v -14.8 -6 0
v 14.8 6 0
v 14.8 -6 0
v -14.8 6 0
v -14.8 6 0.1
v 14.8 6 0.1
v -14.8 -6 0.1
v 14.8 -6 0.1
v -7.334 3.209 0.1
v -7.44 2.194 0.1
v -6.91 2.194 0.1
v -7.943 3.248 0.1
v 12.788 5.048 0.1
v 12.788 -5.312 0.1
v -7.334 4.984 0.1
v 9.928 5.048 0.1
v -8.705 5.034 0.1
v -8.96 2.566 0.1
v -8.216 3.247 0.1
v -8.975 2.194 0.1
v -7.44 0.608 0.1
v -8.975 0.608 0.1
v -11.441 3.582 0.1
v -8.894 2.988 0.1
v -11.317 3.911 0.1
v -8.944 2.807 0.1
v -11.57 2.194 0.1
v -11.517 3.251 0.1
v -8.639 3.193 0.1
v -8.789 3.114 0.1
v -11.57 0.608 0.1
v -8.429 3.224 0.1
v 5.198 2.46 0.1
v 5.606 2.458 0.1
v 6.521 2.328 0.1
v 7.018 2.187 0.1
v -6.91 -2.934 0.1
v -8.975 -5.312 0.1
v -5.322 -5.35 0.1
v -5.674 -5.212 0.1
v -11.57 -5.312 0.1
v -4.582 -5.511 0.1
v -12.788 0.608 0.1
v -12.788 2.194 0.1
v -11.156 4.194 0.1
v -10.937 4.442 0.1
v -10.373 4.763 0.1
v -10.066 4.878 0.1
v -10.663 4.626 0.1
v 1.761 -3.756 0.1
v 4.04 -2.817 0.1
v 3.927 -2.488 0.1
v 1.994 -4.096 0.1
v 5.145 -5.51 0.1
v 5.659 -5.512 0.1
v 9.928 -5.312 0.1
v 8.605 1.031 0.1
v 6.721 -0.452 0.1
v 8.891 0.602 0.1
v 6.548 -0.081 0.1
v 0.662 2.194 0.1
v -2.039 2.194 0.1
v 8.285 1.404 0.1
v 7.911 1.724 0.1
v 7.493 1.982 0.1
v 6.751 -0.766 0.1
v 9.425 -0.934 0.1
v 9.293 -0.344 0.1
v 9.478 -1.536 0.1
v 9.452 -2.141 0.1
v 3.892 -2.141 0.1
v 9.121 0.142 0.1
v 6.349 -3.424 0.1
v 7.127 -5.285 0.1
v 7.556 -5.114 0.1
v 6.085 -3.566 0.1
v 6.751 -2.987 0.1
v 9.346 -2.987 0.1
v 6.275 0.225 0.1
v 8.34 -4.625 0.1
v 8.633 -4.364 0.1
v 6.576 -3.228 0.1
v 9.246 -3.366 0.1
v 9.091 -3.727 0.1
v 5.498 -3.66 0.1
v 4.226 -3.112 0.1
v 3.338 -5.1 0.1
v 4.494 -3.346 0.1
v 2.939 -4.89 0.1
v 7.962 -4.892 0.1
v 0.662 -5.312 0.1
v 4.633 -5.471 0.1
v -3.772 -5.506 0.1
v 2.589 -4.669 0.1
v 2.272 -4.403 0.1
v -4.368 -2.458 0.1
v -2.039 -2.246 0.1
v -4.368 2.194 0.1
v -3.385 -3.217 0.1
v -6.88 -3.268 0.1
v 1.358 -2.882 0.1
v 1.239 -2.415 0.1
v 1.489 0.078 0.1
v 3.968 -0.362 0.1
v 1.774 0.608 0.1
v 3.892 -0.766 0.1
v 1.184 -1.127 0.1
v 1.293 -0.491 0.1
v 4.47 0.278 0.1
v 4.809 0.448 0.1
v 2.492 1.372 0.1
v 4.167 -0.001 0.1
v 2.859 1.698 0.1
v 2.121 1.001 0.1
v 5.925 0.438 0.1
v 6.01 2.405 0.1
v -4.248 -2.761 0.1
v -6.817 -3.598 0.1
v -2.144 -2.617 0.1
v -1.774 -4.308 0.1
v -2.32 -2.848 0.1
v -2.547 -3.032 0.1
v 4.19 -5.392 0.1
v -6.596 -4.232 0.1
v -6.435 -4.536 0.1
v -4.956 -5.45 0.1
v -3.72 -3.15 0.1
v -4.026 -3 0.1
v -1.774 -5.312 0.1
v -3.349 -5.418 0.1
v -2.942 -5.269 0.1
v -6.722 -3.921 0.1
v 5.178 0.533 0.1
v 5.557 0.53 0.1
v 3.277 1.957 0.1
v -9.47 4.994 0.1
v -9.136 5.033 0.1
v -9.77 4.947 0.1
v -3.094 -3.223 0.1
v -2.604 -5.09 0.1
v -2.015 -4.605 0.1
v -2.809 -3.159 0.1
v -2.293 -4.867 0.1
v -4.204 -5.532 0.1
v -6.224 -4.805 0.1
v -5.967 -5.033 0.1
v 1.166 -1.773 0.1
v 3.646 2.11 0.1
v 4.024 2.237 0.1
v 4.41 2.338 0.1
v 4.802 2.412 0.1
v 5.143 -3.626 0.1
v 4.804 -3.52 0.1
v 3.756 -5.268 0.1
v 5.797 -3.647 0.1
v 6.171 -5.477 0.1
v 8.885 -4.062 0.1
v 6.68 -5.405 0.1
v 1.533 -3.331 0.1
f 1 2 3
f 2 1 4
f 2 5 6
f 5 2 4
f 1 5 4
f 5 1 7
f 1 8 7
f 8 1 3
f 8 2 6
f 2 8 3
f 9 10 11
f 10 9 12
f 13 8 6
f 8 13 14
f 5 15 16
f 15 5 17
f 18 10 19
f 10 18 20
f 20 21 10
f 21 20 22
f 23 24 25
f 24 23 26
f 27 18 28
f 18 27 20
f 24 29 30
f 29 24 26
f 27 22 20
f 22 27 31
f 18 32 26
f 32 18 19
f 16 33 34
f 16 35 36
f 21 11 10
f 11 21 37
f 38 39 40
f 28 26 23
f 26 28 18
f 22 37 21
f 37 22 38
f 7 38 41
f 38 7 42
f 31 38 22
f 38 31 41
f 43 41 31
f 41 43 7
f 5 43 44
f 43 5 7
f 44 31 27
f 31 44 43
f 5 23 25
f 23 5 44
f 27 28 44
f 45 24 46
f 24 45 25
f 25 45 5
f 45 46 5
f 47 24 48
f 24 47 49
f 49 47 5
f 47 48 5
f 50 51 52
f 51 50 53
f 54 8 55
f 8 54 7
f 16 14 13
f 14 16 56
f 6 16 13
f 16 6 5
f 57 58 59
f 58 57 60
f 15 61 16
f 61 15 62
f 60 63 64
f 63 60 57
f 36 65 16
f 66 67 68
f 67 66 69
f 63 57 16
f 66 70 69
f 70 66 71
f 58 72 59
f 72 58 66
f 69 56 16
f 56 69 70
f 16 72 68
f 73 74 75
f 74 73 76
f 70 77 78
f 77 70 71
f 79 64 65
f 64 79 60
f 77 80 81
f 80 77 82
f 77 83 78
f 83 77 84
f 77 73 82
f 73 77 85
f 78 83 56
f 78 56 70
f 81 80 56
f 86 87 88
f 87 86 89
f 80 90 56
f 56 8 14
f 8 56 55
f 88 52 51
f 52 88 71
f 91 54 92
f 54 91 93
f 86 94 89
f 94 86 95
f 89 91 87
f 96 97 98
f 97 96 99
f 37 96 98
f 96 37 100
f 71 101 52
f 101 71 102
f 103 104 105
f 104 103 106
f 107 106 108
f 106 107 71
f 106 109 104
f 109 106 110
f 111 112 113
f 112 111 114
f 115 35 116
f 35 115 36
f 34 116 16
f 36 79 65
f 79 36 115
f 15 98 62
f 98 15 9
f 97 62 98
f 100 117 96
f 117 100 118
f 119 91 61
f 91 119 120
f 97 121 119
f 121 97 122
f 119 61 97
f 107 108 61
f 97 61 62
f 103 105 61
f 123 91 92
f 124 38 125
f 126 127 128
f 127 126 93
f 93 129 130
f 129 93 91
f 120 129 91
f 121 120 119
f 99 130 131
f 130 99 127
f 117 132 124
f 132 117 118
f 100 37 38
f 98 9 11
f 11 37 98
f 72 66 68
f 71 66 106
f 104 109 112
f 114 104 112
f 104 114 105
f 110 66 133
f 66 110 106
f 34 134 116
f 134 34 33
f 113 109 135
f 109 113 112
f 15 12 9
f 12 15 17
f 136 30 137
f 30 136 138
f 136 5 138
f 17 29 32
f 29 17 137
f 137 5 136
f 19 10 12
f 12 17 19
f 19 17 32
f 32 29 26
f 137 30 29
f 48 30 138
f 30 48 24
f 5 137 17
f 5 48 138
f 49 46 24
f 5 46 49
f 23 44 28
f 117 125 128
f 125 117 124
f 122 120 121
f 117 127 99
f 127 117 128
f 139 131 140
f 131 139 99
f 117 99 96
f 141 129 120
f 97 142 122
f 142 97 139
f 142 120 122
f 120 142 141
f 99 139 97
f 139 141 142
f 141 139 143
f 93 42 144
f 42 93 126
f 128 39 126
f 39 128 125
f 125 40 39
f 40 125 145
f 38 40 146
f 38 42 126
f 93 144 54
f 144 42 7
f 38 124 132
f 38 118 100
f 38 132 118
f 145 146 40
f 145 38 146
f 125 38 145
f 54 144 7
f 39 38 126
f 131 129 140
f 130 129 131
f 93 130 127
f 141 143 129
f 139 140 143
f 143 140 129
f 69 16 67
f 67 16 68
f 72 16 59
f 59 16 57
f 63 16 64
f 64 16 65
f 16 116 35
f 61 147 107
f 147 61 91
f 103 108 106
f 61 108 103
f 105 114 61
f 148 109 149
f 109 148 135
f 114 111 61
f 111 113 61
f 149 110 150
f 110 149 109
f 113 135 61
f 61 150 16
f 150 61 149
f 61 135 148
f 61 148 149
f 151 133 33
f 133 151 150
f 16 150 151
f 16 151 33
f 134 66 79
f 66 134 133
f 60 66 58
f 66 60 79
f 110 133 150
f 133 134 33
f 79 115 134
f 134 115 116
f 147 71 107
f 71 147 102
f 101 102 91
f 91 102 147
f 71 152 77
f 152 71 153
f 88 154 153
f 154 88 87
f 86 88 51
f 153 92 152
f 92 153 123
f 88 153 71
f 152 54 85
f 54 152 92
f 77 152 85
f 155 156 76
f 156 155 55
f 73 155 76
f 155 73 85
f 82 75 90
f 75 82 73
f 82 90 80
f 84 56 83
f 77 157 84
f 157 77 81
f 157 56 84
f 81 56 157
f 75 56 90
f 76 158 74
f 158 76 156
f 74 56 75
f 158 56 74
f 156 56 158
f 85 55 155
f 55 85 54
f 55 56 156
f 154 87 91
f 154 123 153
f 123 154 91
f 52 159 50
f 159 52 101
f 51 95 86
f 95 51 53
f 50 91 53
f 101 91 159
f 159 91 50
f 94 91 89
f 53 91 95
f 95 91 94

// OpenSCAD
// file: ../p/box5-12.scad
use <../lib.scad>
function ldraw_lib__box5_12() = [
// 0 Box with 5 Faces without Any Edges
// 0 Name: box5-12.dat
// 0 Author: Chris Dee [cwdee]
// 0 !LDRAW_ORG Primitive UPDATE 2009-02
// 0 !LICENSE Licensed under CC BY 4.0 : see CAreadme.txt
// 
// 0 BFC CERTIFY CCW
  [0,"BFC","CERTIFY"],
  [0,"BFC","CCW"],
// 
// 0 !HISTORY 2009-09-03 [PTadmin] Official Update 2009-02
// 
// 
// 4 16 1 1 1 1 1 -1 -1 1 -1 -1 1 1
  [4,16,1,1,1,1,1,-1,-1,1,-1,-1,1,1],
// 4 16 -1 0 1 1 0 1 1 1 1 -1 1 1
  [4,16,-1,0,1,1,0,1,1,1,1,-1,1,1],
// 4 16 -1 0 -1 -1 0 1 -1 1 1 -1 1 -1
  [4,16,-1,0,-1,-1,0,1,-1,1,1,-1,1,-1],
// 4 16 1 0 -1 -1 0 -1 -1 1 -1 1 1 -1
  [4,16,1,0,-1,-1,0,-1,-1,1,-1,1,1,-1],
// 4 16 1 0 1 1 0 -1 1 1 -1 1 1 1
  [4,16,1,0,1,1,0,-1,1,1,-1,1,1,1],
// 0
];
module ldraw_lib__box5_12(step=0, col=false, unit=2/5, alt=false, line=0.2, solid=!$preview)
    makepoly(ldraw_lib__box5_12(), step=step, col=col, unit=unit, alt=alt, line=line, solid=solid);
ldraw_lib__box5_12(line=0.2);
// main file
use <../lib.scad>
use <../p/box5-12.scad>
function ldraw_lib__197915c() = [
// 0 Sticker  1.6 x  3.8 with White "fuel"
// 0 Name: 197915c.dat
// 0 Author: N. W. Perry [Plastikean]
// 0 !LDRAW_ORG Part UPDATE 2020-03
// 0 !LICENSE Licensed under CC BY 4.0 : see CAreadme.txt
// 
// 0 BFC CERTIFY CCW
  [0,"BFC","CERTIFY"],
  [0,"BFC","CCW"],
// 
// 0 !KEYWORDS set 5540
// 
// 0 !HISTORY 2020-12-29 [PTadmin] Official Update 2020-03
// 
// 
// 1 16 0 -0.25 0 37 0 0 0 0.25 0 0 0 15 box5-12.dat
  [1,16,0,-0.25,0,37,0,0,0,0.25,0,0,0,15, ldraw_lib__box5_12()],
// 
// 4 16 -18.335 -0.25 8.022 -19.857 -0.25 8.12 -18.599 -0.25 5.484 -17.276 -0.25 5.484
  [4,16,-18.335,-0.25,8.022,-19.857,-0.25,8.12,-18.599,-0.25,5.484,-17.276,-0.25,5.484],
// 4 16 37 -0.25 15 31.97 -0.25 12.621 31.97 -0.25 -13.281 37 -0.25 -15
  [4,16,37,-0.25,15,31.97,-0.25,12.621,31.97,-0.25,-13.281,37,-0.25,-15],
// 4 16 -18.335 -0.25 12.46 24.821 -0.25 12.621 -37 -0.25 15 -21.762 -0.25 12.584
  [4,16,-18.335,-0.25,12.46,24.821,-0.25,12.621,-37,-0.25,15,-21.762,-0.25,12.584],
// 4 16 -22.4 -0.25 6.415 -22.438 -0.25 5.484 -18.599 -0.25 5.484 -20.54 -0.25 8.118
  [4,16,-22.4,-0.25,6.415,-22.438,-0.25,5.484,-18.599,-0.25,5.484,-20.54,-0.25,8.118],
// 4 15 -18.599 -0.25 1.52 -18.599 -0.25 5.484 -22.438 -0.25 5.484 -22.438 -0.25 1.52
  [4,15,-18.599,-0.25,1.52,-18.599,-0.25,5.484,-22.438,-0.25,5.484,-22.438,-0.25,1.52],
// 4 15 -28.602 -0.25 8.954 -22.359 -0.25 7.017 -22.235 -0.25 7.469 -28.292 -0.25 9.777
  [4,15,-28.602,-0.25,8.954,-22.359,-0.25,7.017,-22.235,-0.25,7.469,-28.292,-0.25,9.777],
// 4 15 -22.4 -0.25 6.415 -28.793 -0.25 8.127 -28.925 -0.25 5.484 -22.438 -0.25 5.484
  [4,15,-22.4,-0.25,6.415,-28.793,-0.25,8.127,-28.925,-0.25,5.484,-22.438,-0.25,5.484],
// 4 16 -21.973 -0.25 7.786 -22.235 -0.25 7.469 -22.359 -0.25 7.017 -21.598 -0.25 7.982
  [4,16,-21.973,-0.25,7.786,-22.235,-0.25,7.469,-22.359,-0.25,7.017,-21.598,-0.25,7.982],
// 4 15 -22.438 -0.25 5.484 -28.925 -0.25 5.484 -28.925 -0.25 1.52 -22.438 -0.25 1.52
  [4,15,-22.438,-0.25,5.484,-28.925,-0.25,5.484,-28.925,-0.25,1.52,-22.438,-0.25,1.52],
// 4 16 -21.072 -0.25 8.059 -22.359 -0.25 7.017 -22.4 -0.25 6.415 -20.54 -0.25 8.118
  [4,16,-21.072,-0.25,8.059,-22.359,-0.25,7.017,-22.4,-0.25,6.415,-20.54,-0.25,8.118],
// 3 16 24.821 -0.25 12.621 12.995 -0.25 6.151 14.014 -0.25 6.145
  [3,16,24.821,-0.25,12.621,12.995,-0.25,6.151,14.014,-0.25,6.145],
// 3 16 24.821 -0.25 12.621 16.303 -0.25 5.821 17.545 -0.25 5.467
  [3,16,24.821,-0.25,12.621,16.303,-0.25,5.821,17.545,-0.25,5.467],
// 4 16 -17.276 -0.25 -7.334 -17.276 -0.25 5.484 -18.599 -0.25 5.484 -18.599 -0.25 1.52
  [4,16,-17.276,-0.25,-7.334,-17.276,-0.25,5.484,-18.599,-0.25,5.484,-18.599,-0.25,1.52],
// 3 16 -22.438 -0.25 -13.281 -13.304 -0.25 -13.376 -14.185 -0.25 -13.03
  [3,16,-22.438,-0.25,-13.281,-13.304,-0.25,-13.376,-14.185,-0.25,-13.03],
// 4 15 -28.793 -0.25 8.127 -22.4 -0.25 6.415 -22.359 -0.25 7.017 -28.602 -0.25 8.954
  [4,15,-28.793,-0.25,8.127,-22.4,-0.25,6.415,-22.359,-0.25,7.017,-28.602,-0.25,8.954],
// 4 16 -17.276 -0.25 -7.334 -18.599 -0.25 1.52 -22.438 -0.25 1.52 -22.438 -0.25 -13.281
  [4,16,-17.276,-0.25,-7.334,-18.599,-0.25,1.52,-22.438,-0.25,1.52,-22.438,-0.25,-13.281],
// 4 16 -37 -0.25 -15 -11.456 -0.25 -13.778 -22.438 -0.25 -13.281 -28.925 -0.25 -13.281
  [4,16,-37,-0.25,-15,-11.456,-0.25,-13.778,-22.438,-0.25,-13.281,-28.925,-0.25,-13.281],
// 4 15 -28.925 -0.25 -13.281 -22.438 -0.25 -13.281 -22.438 -0.25 1.52 -28.925 -0.25 1.52
  [4,15,-28.925,-0.25,-13.281,-22.438,-0.25,-13.281,-22.438,-0.25,1.52,-28.925,-0.25,1.52],
// 4 16 -28.925 -0.25 -13.281 -28.925 -0.25 1.52 -31.97 -0.25 1.52 -37 -0.25 -15
  [4,16,-28.925,-0.25,-13.281,-28.925,-0.25,1.52,-31.97,-0.25,1.52,-37,-0.25,-15],
// 4 16 -31.97 -0.25 1.52 -31.97 -0.25 5.484 -37 -0.25 15 -37 -0.25 -15
  [4,16,-31.97,-0.25,1.52,-31.97,-0.25,5.484,-37,-0.25,15,-37,-0.25,-15],
// 4 15 -31.97 -0.25 5.484 -31.97 -0.25 1.52 -28.925 -0.25 1.52 -28.925 -0.25 5.484
  [4,15,-31.97,-0.25,5.484,-31.97,-0.25,1.52,-28.925,-0.25,1.52,-28.925,-0.25,5.484],
// 4 16 -28.602 -0.25 8.954 -28.292 -0.25 9.777 -37 -0.25 15 -31.97 -0.25 5.484
  [4,16,-28.602,-0.25,8.954,-28.292,-0.25,9.777,-37,-0.25,15,-31.97,-0.25,5.484],
// 3 16 -28.925 -0.25 5.484 -28.793 -0.25 8.127 -31.97 -0.25 5.484
  [3,16,-28.925,-0.25,5.484,-28.793,-0.25,8.127,-31.97,-0.25,5.484],
// 4 15 -27.89 -0.25 10.486 -28.292 -0.25 9.777 -22.235 -0.25 7.469 -27.343 -0.25 11.104
  [4,15,-27.89,-0.25,10.486,-28.292,-0.25,9.777,-22.235,-0.25,7.469,-27.343,-0.25,11.104],
// 3 16 -28.292 -0.25 9.777 -27.89 -0.25 10.486 -37 -0.25 15
  [3,16,-28.292,-0.25,9.777,-27.89,-0.25,10.486,-37,-0.25,15],
// 3 16 -27.89 -0.25 10.486 -27.343 -0.25 11.104 -37 -0.25 15
  [3,16,-27.89,-0.25,10.486,-27.343,-0.25,11.104,-37,-0.25,15],
// 4 15 -25.932 -0.25 11.908 -26.658 -0.25 11.566 -22.235 -0.25 7.469 -25.166 -0.25 12.196
  [4,15,-25.932,-0.25,11.908,-26.658,-0.25,11.566,-22.235,-0.25,7.469,-25.166,-0.25,12.196],
// 3 16 -26.658 -0.25 11.566 -25.932 -0.25 11.908 -37 -0.25 15
  [3,16,-26.658,-0.25,11.566,-25.932,-0.25,11.908,-37,-0.25,15],
// 3 16 -25.932 -0.25 11.908 -25.166 -0.25 12.196 -37 -0.25 15
  [3,16,-25.932,-0.25,11.908,-25.166,-0.25,12.196,-37,-0.25,15],
// 4 15 4.402 -0.25 -9.389 4.986 -0.25 -10.241 10.101 -0.25 -7.042 9.817 -0.25 -6.219
  [4,15,4.402,-0.25,-9.389,4.986,-0.25,-10.241,10.101,-0.25,-7.042,9.817,-0.25,-6.219],
// 4 16 -37 -0.25 -15 37 -0.25 -15 14.147 -0.25 -13.779 12.863 -0.25 -13.775
  [4,16,-37,-0.25,-15,37,-0.25,-15,14.147,-0.25,-13.779,12.863,-0.25,-13.775],
// 4 15 24.821 -0.25 -13.281 31.97 -0.25 -13.281 31.97 -0.25 12.621 24.821 -0.25 12.621
  [4,15,24.821,-0.25,-13.281,31.97,-0.25,-13.281,31.97,-0.25,12.621,24.821,-0.25,12.621],
// 4 16 -37 -0.25 15 24.821 -0.25 12.621 31.97 -0.25 12.621 37 -0.25 15
  [4,16,-37,-0.25,15,24.821,-0.25,12.621,31.97,-0.25,12.621,37,-0.25,15],
// 4 15 21.512 -0.25 2.577 16.371 -0.25 -0.202 16.803 -0.25 -1.131 22.227 -0.25 1.506
  [4,15,21.512,-0.25,2.577,16.371,-0.25,-0.202,16.803,-0.25,-1.131,22.227,-0.25,1.506],
// 4 16 1.655 -0.25 5.484 24.821 -0.25 12.621 -18.335 -0.25 12.46 -5.097 -0.25 5.484
  [4,16,1.655,-0.25,5.484,24.821,-0.25,12.621,-18.335,-0.25,12.46,-5.097,-0.25,5.484],
// 4 15 20.712 -0.25 3.51 19.778 -0.25 4.309 16.371 -0.25 -0.202 21.512 -0.25 2.577
  [4,15,20.712,-0.25,3.51,19.778,-0.25,4.309,16.371,-0.25,-0.202,21.512,-0.25,2.577],
// 3 16 17.545 -0.25 5.467 18.732 -0.25 4.956 24.821 -0.25 12.621
  [3,16,17.545,-0.25,5.467,18.732,-0.25,4.956,24.821,-0.25,12.621],
// 4 15 23.563 -0.25 -2.335 23.233 -0.25 -0.859 16.878 -0.25 -1.916 23.696 -0.25 -3.841
  [4,15,23.563,-0.25,-2.335,23.233,-0.25,-0.859,16.878,-0.25,-1.916,23.696,-0.25,-3.841],
// 3 16 20.712 -0.25 3.51 21.512 -0.25 2.577 24.821 -0.25 12.621
  [3,16,20.712,-0.25,3.51,21.512,-0.25,2.577,24.821,-0.25,12.621],
// 4 15 23.63 -0.25 -5.352 23.696 -0.25 -3.841 16.878 -0.25 -1.916 9.73 -0.25 -5.352
  [4,15,23.63,-0.25,-5.352,23.696,-0.25,-3.841,16.878,-0.25,-1.916,9.73,-0.25,-5.352],
// 4 15 22.803 -0.25 0.355 22.227 -0.25 1.506 16.803 -0.25 -1.131 16.878 -0.25 -1.916
  [4,15,22.803,-0.25,0.355,22.227,-0.25,1.506,16.803,-0.25,-1.131,16.878,-0.25,-1.916],
// 4 16 23.696 -0.25 -3.841 23.63 -0.25 -5.352 24.821 -0.25 -13.281 24.821 -0.25 12.621
  [4,16,23.696,-0.25,-3.841,23.63,-0.25,-5.352,24.821,-0.25,-13.281,24.821,-0.25,12.621],
// 3 16 24.821 -0.25 12.621 22.803 -0.25 0.355 23.233 -0.25 -0.859
  [3,16,24.821,-0.25,12.621,22.803,-0.25,0.355,23.233,-0.25,-0.859],
// 4 15 15.873 -0.25 -8.561 15.213 -0.25 -8.916 17.817 -0.25 -13.213 18.891 -0.25 -12.784
  [4,15,15.873,-0.25,-8.561,15.213,-0.25,-8.916,17.817,-0.25,-13.213,18.891,-0.25,-12.784],
// 4 16 23.63 -0.25 -5.352 9.73 -0.25 -5.352 16.878 -0.25 -7.467 23.365 -0.25 -7.467
  [4,16,23.63,-0.25,-5.352,9.73,-0.25,-5.352,16.878,-0.25,-7.467,23.365,-0.25,-7.467],
// 4 15 15.687 -0.25 0.562 16.371 -0.25 -0.202 19.778 -0.25 4.309 18.732 -0.25 4.956
  [4,15,15.687,-0.25,0.562,16.371,-0.25,-0.202,19.778,-0.25,4.309,18.732,-0.25,4.956],
// 4 15 16.878 -0.25 -7.467 16.439 -0.25 -8.071 20.85 -0.25 -11.563 21.583 -0.25 -10.91
  [4,15,16.878,-0.25,-7.467,16.439,-0.25,-8.071,20.85,-0.25,-11.563,21.583,-0.25,-10.91],
// 4 15 23.115 -0.25 -8.416 23.365 -0.25 -7.467 16.878 -0.25 -7.467 22.727 -0.25 -9.318
  [4,15,23.115,-0.25,-8.416,23.365,-0.25,-7.467,16.878,-0.25,-7.467,22.727,-0.25,-9.318],
// 4 16 15.873 -0.25 -8.561 16.439 -0.25 -8.071 16.878 -0.25 -7.467 13.744 -0.25 -9.15
  [4,16,15.873,-0.25,-8.561,16.439,-0.25,-8.071,16.878,-0.25,-7.467,13.744,-0.25,-9.15],
// 3 16 23.365 -0.25 -7.467 23.115 -0.25 -8.416 24.821 -0.25 -13.281
  [3,16,23.365,-0.25,-7.467,23.115,-0.25,-8.416,24.821,-0.25,-13.281],
// 3 16 23.365 -0.25 -7.467 24.821 -0.25 -13.281 23.63 -0.25 -5.352
  [3,16,23.365,-0.25,-7.467,24.821,-0.25,-13.281,23.63,-0.25,-5.352],
// 3 16 21.583 -0.25 -10.91 20.85 -0.25 -11.563 24.821 -0.25 -13.281
  [3,16,21.583,-0.25,-10.91,20.85,-0.25,-11.563,24.821,-0.25,-13.281],
// 4 15 8.344 -0.25 -12.749 11.235 -0.25 -8.364 10.565 -0.25 -7.78 7.347 -0.25 -12.224
  [4,15,8.344,-0.25,-12.749,11.235,-0.25,-8.364,10.565,-0.25,-7.78,7.347,-0.25,-12.224],
// 3 16 20.85 -0.25 -11.563 19.906 -0.25 -12.231 24.821 -0.25 -13.281
  [3,16,20.85,-0.25,-11.563,19.906,-0.25,-12.231,24.821,-0.25,-13.281],
// 4 16 14.147 -0.25 -13.779 37 -0.25 -15 31.97 -0.25 -13.281 24.821 -0.25 -13.281
  [4,16,14.147,-0.25,-13.779,37,-0.25,-15,31.97,-0.25,-13.281,24.821,-0.25,-13.281],
// 4 16 9.817 -0.25 -6.219 10.101 -0.25 -7.042 11.235 -0.25 -8.364 9.73 -0.25 -5.352
  [4,16,9.817,-0.25,-6.219,10.101,-0.25,-7.042,11.235,-0.25,-8.364,9.73,-0.25,-5.352],
// 4 16 12.863 -0.25 -13.775 11.583 -0.25 -13.678 1.655 -0.25 -13.281 -9.431 -0.25 -13.764
  [4,16,12.863,-0.25,-13.775,11.583,-0.25,-13.678,1.655,-0.25,-13.281,-9.431,-0.25,-13.764],
// 4 15 6.472 -0.25 -11.672 7.347 -0.25 -12.224 10.565 -0.25 -7.78 5.681 -0.25 -11.007
  [4,15,6.472,-0.25,-11.672,7.347,-0.25,-12.224,10.565,-0.25,-7.78,5.681,-0.25,-11.007],
// 3 16 7.347 -0.25 -12.224 1.655 -0.25 -13.281 8.344 -0.25 -12.749
  [3,16,7.347,-0.25,-12.224,1.655,-0.25,-13.281,8.344,-0.25,-12.749],
// 4 16 -10.921 -0.25 -6.145 -8.463 -0.25 -8.043 -5.097 -0.25 -5.616 -10.921 -0.25 5.484
  [4,16,-10.921,-0.25,-6.145,-8.463,-0.25,-8.043,-5.097,-0.25,-5.616,-10.921,-0.25,5.484],
// 4 15 -10.921 -0.25 -6.145 -10.921 -0.25 5.484 -17.276 -0.25 -7.334 -17.2 -0.25 -8.171
  [4,15,-10.921,-0.25,-6.145,-10.921,-0.25,5.484,-17.276,-0.25,-7.334,-17.2,-0.25,-8.171],
// 4 15 3.396 -0.25 -7.204 9.817 -0.25 -6.219 9.73 -0.25 -5.352 3.098 -0.25 -6.037
  [4,15,3.396,-0.25,-7.204,9.817,-0.25,-6.219,9.73,-0.25,-5.352,3.098,-0.25,-6.037],
// 4 15 9.921 -0.25 -0.904 4.435 -0.25 1.52 3.722 -0.25 0.195 9.73 -0.25 -1.916
  [4,15,9.921,-0.25,-0.904,4.435,-0.25,1.52,3.722,-0.25,0.195,9.73,-0.25,-1.916],
// 4 15 9.73 -0.25 -1.916 3.233 -0.25 -1.227 2.959 -0.25 -2.818 9.73 -0.25 -5.352
  [4,15,9.73,-0.25,-1.916,3.233,-0.25,-1.227,2.959,-0.25,-2.818,9.73,-0.25,-5.352],
// 4 16 9.73 -0.25 -1.916 12.022 -0.25 1.12 11.175 -0.25 0.695 9.921 -0.25 -0.904
  [4,16,9.73,-0.25,-1.916,12.022,-0.25,1.12,11.175,-0.25,0.695,9.921,-0.25,-0.904],
// 4 15 10.417 -0.25 -0.003 7.148 -0.25 4.246 6.23 -0.25 3.429 5.302 -0.25 2.503
  [4,15,10.417,-0.25,-0.003,7.148,-0.25,4.246,6.23,-0.25,3.429,5.302,-0.25,2.503],
// 4 15 14.812 -0.25 1.094 17.545 -0.25 5.467 16.303 -0.25 5.821 15.025 -0.25 6.013
  [4,15,14.812,-0.25,1.094,17.545,-0.25,5.467,16.303,-0.25,5.821,15.025,-0.25,6.013],
// 3 16 14.014 -0.25 6.145 15.025 -0.25 6.013 24.821 -0.25 12.621
  [3,16,14.014,-0.25,6.145,15.025,-0.25,6.013,24.821,-0.25,12.621],
// 4 15 15.687 -0.25 0.562 18.732 -0.25 4.956 17.545 -0.25 5.467 14.812 -0.25 1.094
  [4,15,15.687,-0.25,0.562,18.732,-0.25,4.956,17.545,-0.25,5.467,14.812,-0.25,1.094],
// 4 16 -18.335 -0.25 12.46 -18.335 -0.25 8.022 -10.921 -0.25 5.484 -5.097 -0.25 5.484
  [4,16,-18.335,-0.25,12.46,-18.335,-0.25,8.022,-10.921,-0.25,5.484,-5.097,-0.25,5.484],
// 3 16 -5.097 -0.25 -5.616 -5.097 -0.25 5.484 -10.921 -0.25 5.484
  [3,16,-5.097,-0.25,-5.616,-5.097,-0.25,5.484,-10.921,-0.25,5.484],
// 4 15 -10.619 -0.25 -6.902 -10.921 -0.25 -6.145 -17.2 -0.25 -8.171 -17.042 -0.25 -8.996
  [4,15,-10.619,-0.25,-6.902,-10.921,-0.25,-6.145,-17.2,-0.25,-8.171,-17.042,-0.25,-8.996],
// 4 15 -5.361 -0.25 -6.542 -4.435 -0.25 -10.77 1.655 -0.25 -13.281 1.655 -0.25 5.484
  [4,15,-5.361,-0.25,-6.542,-4.435,-0.25,-10.77,1.655,-0.25,-13.281,1.655,-0.25,5.484],
// 4 16 -5.097 -0.25 -5.616 -6.367 -0.25 -7.58 -5.801 -0.25 -7.121 -5.361 -0.25 -6.542
  [4,16,-5.097,-0.25,-5.616,-6.367,-0.25,-7.58,-5.801,-0.25,-7.121,-5.361,-0.25,-6.542],
// 3 15 -5.361 -0.25 -6.542 1.655 -0.25 5.484 -5.097 -0.25 -5.616
  [3,15,-5.361,-0.25,-6.542,1.655,-0.25,5.484,-5.097,-0.25,-5.616],
// 3 16 2.959 -0.25 -2.818 3.233 -0.25 -1.227 1.655 -0.25 5.484
  [3,16,2.959,-0.25,-2.818,3.233,-0.25,-1.227,1.655,-0.25,5.484],
// 3 15 -5.097 -0.25 -5.616 1.655 -0.25 5.484 -5.097 -0.25 5.484
  [3,15,-5.097,-0.25,-5.616,1.655,-0.25,5.484,-5.097,-0.25,5.484],
// 3 16 3.722 -0.25 0.195 4.435 -0.25 1.52 1.655 -0.25 5.484
  [3,16,3.722,-0.25,0.195,4.435,-0.25,1.52,1.655,-0.25,5.484],
// 3 16 10.474 -0.25 -13.48 1.655 -0.25 -13.281 11.583 -0.25 -13.678
  [3,16,10.474,-0.25,-13.48,1.655,-0.25,-13.281,11.583,-0.25,-13.678],
// 3 16 -16.489 -0.25 -10.58 -22.438 -0.25 -13.281 -16.088 -0.25 -11.339
  [3,16,-16.489,-0.25,-10.58,-22.438,-0.25,-13.281,-16.088,-0.25,-11.339],
// 4 15 -9.299 -0.25 -7.875 -10.065 -0.25 -7.501 -12.391 -0.25 -13.626 -9.431 -0.25 -13.764
  [4,15,-9.299,-0.25,-7.875,-10.065,-0.25,-7.501,-12.391,-0.25,-13.626,-9.431,-0.25,-13.764],
// 4 16 -9.431 -0.25 -13.764 1.655 -0.25 -13.281 -4.435 -0.25 -13.281 -8.372 -0.25 -13.544
  [4,16,-9.431,-0.25,-13.764,1.655,-0.25,-13.281,-4.435,-0.25,-13.281,-8.372,-0.25,-13.544],
// 3 15 -4.435 -0.25 -10.77 -4.435 -0.25 -13.281 1.655 -0.25 -13.281
  [3,15,-4.435,-0.25,-10.77,-4.435,-0.25,-13.281,1.655,-0.25,-13.281],
// 3 15 -5.801 -0.25 -7.121 -4.435 -0.25 -10.77 -5.361 -0.25 -6.542
  [3,15,-5.801,-0.25,-7.121,-4.435,-0.25,-10.77,-5.361,-0.25,-6.542],
// 4 15 -8.463 -0.25 -8.043 -9.299 -0.25 -7.875 -8.372 -0.25 -13.544 -7.355 -0.25 -13.172
  [4,15,-8.463,-0.25,-8.043,-9.299,-0.25,-7.875,-8.372,-0.25,-13.544,-7.355,-0.25,-13.172],
// 4 15 -16.805 -0.25 -9.802 -16.489 -0.25 -10.58 -10.619 -0.25 -6.902 -17.042 -0.25 -8.996
  [4,15,-16.805,-0.25,-9.802,-16.489,-0.25,-10.58,-10.619,-0.25,-6.902,-17.042,-0.25,-8.996],
// 3 16 -17.2 -0.25 -8.171 -17.276 -0.25 -7.334 -22.438 -0.25 -13.281
  [3,16,-17.2,-0.25,-8.171,-17.276,-0.25,-7.334,-22.438,-0.25,-13.281],
// 3 16 -10.921 -0.25 5.484 -18.335 -0.25 8.022 -17.276 -0.25 5.484
  [3,16,-10.921,-0.25,5.484,-18.335,-0.25,8.022,-17.276,-0.25,5.484],
// 3 15 -17.276 -0.25 5.484 -17.276 -0.25 -7.334 -10.921 -0.25 5.484
  [3,15,-17.276,-0.25,5.484,-17.276,-0.25,-7.334,-10.921,-0.25,5.484],
// 3 15 22.803 -0.25 0.355 16.878 -0.25 -1.916 23.233 -0.25 -0.859
  [3,15,22.803,-0.25,0.355,16.878,-0.25,-1.916,23.233,-0.25,-0.859],
// 3 15 9.73 -0.25 -5.352 16.878 -0.25 -1.916 9.73 -0.25 -1.916
  [3,15,9.73,-0.25,-5.352,16.878,-0.25,-1.916,9.73,-0.25,-1.916],
// 3 16 9.921 -0.25 -0.904 11.175 -0.25 0.695 10.417 -0.25 -0.003
  [3,16,9.921,-0.25,-0.904,11.175,-0.25,0.695,10.417,-0.25,-0.003],
// 4 15 5.302 -0.25 2.503 4.435 -0.25 1.52 9.921 -0.25 -0.904 10.417 -0.25 -0.003
  [4,15,5.302,-0.25,2.503,4.435,-0.25,1.52,9.921,-0.25,-0.904,10.417,-0.25,-0.003],
// 4 16 12.945 -0.25 1.333 12.022 -0.25 1.12 9.73 -0.25 -1.916 16.878 -0.25 -1.916
  [4,16,12.945,-0.25,1.333,12.022,-0.25,1.12,9.73,-0.25,-1.916,16.878,-0.25,-1.916],
// 4 15 13.893 -0.25 1.325 15.025 -0.25 6.013 14.014 -0.25 6.145 12.995 -0.25 6.151
  [4,15,13.893,-0.25,1.325,15.025,-0.25,6.013,14.014,-0.25,6.145,12.995,-0.25,6.151],
// 4 15 7.148 -0.25 4.246 10.417 -0.25 -0.003 11.175 -0.25 0.695 8.193 -0.25 4.893
  [4,15,7.148,-0.25,4.246,10.417,-0.25,-0.003,11.175,-0.25,0.695,8.193,-0.25,4.893],
// 4 15 -19.857 -0.25 8.12 -18.335 -0.25 8.022 -18.335 -0.25 12.46 -21.762 -0.25 12.584
  [4,15,-19.857,-0.25,8.12,-18.335,-0.25,8.022,-18.335,-0.25,12.46,-21.762,-0.25,12.584],
// 4 15 -23.674 -0.25 12.484 -24.426 -0.25 12.367 -21.973 -0.25 7.786 -22.841 -0.25 12.582
  [4,15,-23.674,-0.25,12.484,-24.426,-0.25,12.367,-21.973,-0.25,7.786,-22.841,-0.25,12.582],
// 3 16 -23.674 -0.25 12.484 -37 -0.25 15 -24.426 -0.25 12.367
  [3,16,-23.674,-0.25,12.484,-37,-0.25,15,-24.426,-0.25,12.367],
// 4 15 -21.598 -0.25 7.982 -21.072 -0.25 8.059 -21.762 -0.25 12.584 -22.841 -0.25 12.582
  [4,15,-21.598,-0.25,7.982,-21.072,-0.25,8.059,-21.762,-0.25,12.584,-22.841,-0.25,12.582],
// 3 16 -22.841 -0.25 12.582 -37 -0.25 15 -23.674 -0.25 12.484
  [3,16,-22.841,-0.25,12.582,-37,-0.25,15,-23.674,-0.25,12.484],
// 3 16 -20.54 -0.25 8.118 -18.599 -0.25 5.484 -19.857 -0.25 8.12
  [3,16,-20.54,-0.25,8.118,-18.599,-0.25,5.484,-19.857,-0.25,8.12],
// 3 15 -19.857 -0.25 8.12 -21.762 -0.25 12.584 -20.54 -0.25 8.118
  [3,15,-19.857,-0.25,8.12,-21.762,-0.25,12.584,-20.54,-0.25,8.118],
// 3 15 -20.54 -0.25 8.118 -21.762 -0.25 12.584 -21.072 -0.25 8.059
  [3,15,-20.54,-0.25,8.118,-21.762,-0.25,12.584,-21.072,-0.25,8.059],
// 3 16 -21.072 -0.25 8.059 -21.598 -0.25 7.982 -22.359 -0.25 7.017
  [3,16,-21.072,-0.25,8.059,-21.598,-0.25,7.982,-22.359,-0.25,7.017],
// 3 15 -22.841 -0.25 12.582 -21.973 -0.25 7.786 -21.598 -0.25 7.982
  [3,15,-22.841,-0.25,12.582,-21.973,-0.25,7.786,-21.598,-0.25,7.982],
// 4 15 -25.166 -0.25 12.196 -22.235 -0.25 7.469 -21.973 -0.25 7.786 -24.426 -0.25 12.367
  [4,15,-25.166,-0.25,12.196,-22.235,-0.25,7.469,-21.973,-0.25,7.786,-24.426,-0.25,12.367],
// 3 16 -37 -0.25 15 -22.841 -0.25 12.582 -21.762 -0.25 12.584
  [3,16,-37,-0.25,15,-22.841,-0.25,12.582,-21.762,-0.25,12.584],
// 3 16 -37 -0.25 15 -25.166 -0.25 12.196 -24.426 -0.25 12.367
  [3,16,-37,-0.25,15,-25.166,-0.25,12.196,-24.426,-0.25,12.367],
// 3 15 -26.658 -0.25 11.566 -27.343 -0.25 11.104 -22.235 -0.25 7.469
  [3,15,-26.658,-0.25,11.566,-27.343,-0.25,11.104,-22.235,-0.25,7.469],
// 3 16 -37 -0.25 15 -27.343 -0.25 11.104 -26.658 -0.25 11.566
  [3,16,-37,-0.25,15,-27.343,-0.25,11.104,-26.658,-0.25,11.566],
// 3 16 -28.602 -0.25 8.954 -31.97 -0.25 5.484 -28.793 -0.25 8.127
  [3,16,-28.602,-0.25,8.954,-31.97,-0.25,5.484,-28.793,-0.25,8.127],
// 4 15 -10.619 -0.25 -6.902 -16.489 -0.25 -10.58 -16.088 -0.25 -11.339 -10.065 -0.25 -7.501
  [4,15,-10.619,-0.25,-6.902,-16.489,-0.25,-10.58,-16.088,-0.25,-11.339,-10.065,-0.25,-7.501],
// 3 15 -6.367 -0.25 -7.58 -4.435 -0.25 -10.77 -5.801 -0.25 -7.121
  [3,15,-6.367,-0.25,-7.58,-4.435,-0.25,-10.77,-5.801,-0.25,-7.121],
// 4 16 -10.619 -0.25 -6.902 -10.065 -0.25 -7.501 -9.299 -0.25 -7.875 -8.463 -0.25 -8.043
  [4,16,-10.619,-0.25,-6.902,-10.065,-0.25,-7.501,-9.299,-0.25,-7.875,-8.463,-0.25,-8.043],
// 4 15 -6.51 -0.25 -12.725 -7.735 -0.25 -8.057 -8.463 -0.25 -8.043 -7.355 -0.25 -13.172
  [4,15,-6.51,-0.25,-12.725,-7.735,-0.25,-8.057,-8.463,-0.25,-8.043,-7.355,-0.25,-13.172],
// 3 16 -10.619 -0.25 -6.902 -8.463 -0.25 -8.043 -10.921 -0.25 -6.145
  [3,16,-10.619,-0.25,-6.902,-8.463,-0.25,-8.043,-10.921,-0.25,-6.145],
// 3 16 -5.037 -0.25 -11.513 -4.435 -0.25 -13.281 -4.435 -0.25 -10.77
  [3,16,-5.037,-0.25,-11.513,-4.435,-0.25,-13.281,-4.435,-0.25,-10.77],
// 4 16 -7.023 -0.25 -7.898 -6.367 -0.25 -7.58 -5.097 -0.25 -5.616 -7.735 -0.25 -8.057
  [4,16,-7.023,-0.25,-7.898,-6.367,-0.25,-7.58,-5.097,-0.25,-5.616,-7.735,-0.25,-8.057],
// 4 15 -4.435 -0.25 -10.77 -6.367 -0.25 -7.58 -7.023 -0.25 -7.898 -5.037 -0.25 -11.513
  [4,15,-4.435,-0.25,-10.77,-6.367,-0.25,-7.58,-7.023,-0.25,-7.898,-5.037,-0.25,-11.513],
// 3 16 -8.463 -0.25 -8.043 -7.735 -0.25 -8.057 -5.097 -0.25 -5.616
  [3,16,-8.463,-0.25,-8.043,-7.735,-0.25,-8.057,-5.097,-0.25,-5.616],
// 4 15 -5.037 -0.25 -11.513 -7.023 -0.25 -7.898 -7.735 -0.25 -8.057 -5.733 -0.25 -12.168
  [4,15,-5.037,-0.25,-11.513,-7.023,-0.25,-7.898,-7.735,-0.25,-8.057,-5.733,-0.25,-12.168],
// 4 15 -10.511 -0.25 -13.829 -9.431 -0.25 -13.764 -12.391 -0.25 -13.626 -11.456 -0.25 -13.778
  [4,15,-10.511,-0.25,-13.829,-9.431,-0.25,-13.764,-12.391,-0.25,-13.626,-11.456,-0.25,-13.778],
// 4 15 -12.391 -0.25 -13.626 -10.065 -0.25 -7.501 -16.088 -0.25 -11.339 -13.304 -0.25 -13.376
  [4,15,-12.391,-0.25,-13.626,-10.065,-0.25,-7.501,-16.088,-0.25,-11.339,-13.304,-0.25,-13.376],
// 4 15 -14.185 -0.25 -13.03 -13.304 -0.25 -13.376 -16.088 -0.25 -11.339 -15.559 -0.25 -12.013
  [4,15,-14.185,-0.25,-13.03,-13.304,-0.25,-13.376,-16.088,-0.25,-11.339,-15.559,-0.25,-12.013],
// 3 16 -22.438 -0.25 -13.281 -14.185 -0.25 -13.03 -14.918 -0.25 -12.583
  [3,16,-22.438,-0.25,-13.281,-14.185,-0.25,-13.03,-14.918,-0.25,-12.583],
// 3 16 -22.438 -0.25 -13.281 -11.456 -0.25 -13.778 -12.391 -0.25 -13.626
  [3,16,-22.438,-0.25,-13.281,-11.456,-0.25,-13.778,-12.391,-0.25,-13.626],
// 3 16 -9.431 -0.25 -13.764 -10.511 -0.25 -13.829 12.863 -0.25 -13.775
  [3,16,-9.431,-0.25,-13.764,-10.511,-0.25,-13.829,12.863,-0.25,-13.775],
// 3 16 -10.511 -0.25 -13.829 -11.456 -0.25 -13.778 -37 -0.25 -15
  [3,16,-10.511,-0.25,-13.829,-11.456,-0.25,-13.778,-37,-0.25,-15],
// 3 16 -22.438 -0.25 -13.281 -16.489 -0.25 -10.58 -16.805 -0.25 -9.802
  [3,16,-22.438,-0.25,-13.281,-16.489,-0.25,-10.58,-16.805,-0.25,-9.802],
// 3 16 -22.438 -0.25 -13.281 -17.042 -0.25 -8.996 -17.2 -0.25 -8.171
  [3,16,-22.438,-0.25,-13.281,-17.042,-0.25,-8.996,-17.2,-0.25,-8.171],
// 3 16 -22.438 -0.25 -13.281 -16.805 -0.25 -9.802 -17.042 -0.25 -8.996
  [3,16,-22.438,-0.25,-13.281,-16.805,-0.25,-9.802,-17.042,-0.25,-8.996],
// 3 15 -15.559 -0.25 -12.013 -14.918 -0.25 -12.583 -14.185 -0.25 -13.03
  [3,15,-15.559,-0.25,-12.013,-14.918,-0.25,-12.583,-14.185,-0.25,-13.03],
// 3 16 -15.559 -0.25 -12.013 -22.438 -0.25 -13.281 -14.918 -0.25 -12.583
  [3,16,-15.559,-0.25,-12.013,-22.438,-0.25,-13.281,-14.918,-0.25,-12.583],
// 3 16 -16.088 -0.25 -11.339 -22.438 -0.25 -13.281 -15.559 -0.25 -12.013
  [3,16,-16.088,-0.25,-11.339,-22.438,-0.25,-13.281,-15.559,-0.25,-12.013],
// 3 16 12.863 -0.25 -13.775 -10.511 -0.25 -13.829 -37 -0.25 -15
  [3,16,12.863,-0.25,-13.775,-10.511,-0.25,-13.829,-37,-0.25,-15],
// 3 16 -13.304 -0.25 -13.376 -22.438 -0.25 -13.281 -12.391 -0.25 -13.626
  [3,16,-13.304,-0.25,-13.376,-22.438,-0.25,-13.281,-12.391,-0.25,-13.626],
// 3 16 -7.355 -0.25 -13.172 -4.435 -0.25 -13.281 -6.51 -0.25 -12.725
  [3,16,-7.355,-0.25,-13.172,-4.435,-0.25,-13.281,-6.51,-0.25,-12.725],
// 3 16 -8.372 -0.25 -13.544 -4.435 -0.25 -13.281 -7.355 -0.25 -13.172
  [3,16,-8.372,-0.25,-13.544,-4.435,-0.25,-13.281,-7.355,-0.25,-13.172],
// 3 15 -9.431 -0.25 -13.764 -8.372 -0.25 -13.544 -9.299 -0.25 -7.875
  [3,15,-9.431,-0.25,-13.764,-8.372,-0.25,-13.544,-9.299,-0.25,-7.875],
// 3 16 -5.037 -0.25 -11.513 -5.733 -0.25 -12.168 -4.435 -0.25 -13.281
  [3,16,-5.037,-0.25,-11.513,-5.733,-0.25,-12.168,-4.435,-0.25,-13.281],
// 3 15 -7.735 -0.25 -8.057 -6.51 -0.25 -12.725 -5.733 -0.25 -12.168
  [3,15,-7.735,-0.25,-8.057,-6.51,-0.25,-12.725,-5.733,-0.25,-12.168],
// 3 16 -5.733 -0.25 -12.168 -6.51 -0.25 -12.725 -4.435 -0.25 -13.281
  [3,16,-5.733,-0.25,-12.168,-6.51,-0.25,-12.725,-4.435,-0.25,-13.281],
// 3 16 23.696 -0.25 -3.841 24.821 -0.25 12.621 23.563 -0.25 -2.335
  [3,16,23.696,-0.25,-3.841,24.821,-0.25,12.621,23.563,-0.25,-2.335],
// 3 16 23.563 -0.25 -2.335 24.821 -0.25 12.621 23.233 -0.25 -0.859
  [3,16,23.563,-0.25,-2.335,24.821,-0.25,12.621,23.233,-0.25,-0.859],
// 3 16 22.803 -0.25 0.355 24.821 -0.25 12.621 22.227 -0.25 1.506
  [3,16,22.803,-0.25,0.355,24.821,-0.25,12.621,22.227,-0.25,1.506],
// 3 16 22.227 -0.25 1.506 24.821 -0.25 12.621 21.512 -0.25 2.577
  [3,16,22.227,-0.25,1.506,24.821,-0.25,12.621,21.512,-0.25,2.577],
// 3 16 20.712 -0.25 3.51 24.821 -0.25 12.621 19.778 -0.25 4.309
  [3,16,20.712,-0.25,3.51,24.821,-0.25,12.621,19.778,-0.25,4.309],
// 3 16 19.778 -0.25 4.309 24.821 -0.25 12.621 18.732 -0.25 4.956
  [3,16,19.778,-0.25,4.309,24.821,-0.25,12.621,18.732,-0.25,4.956],
// 3 16 24.821 -0.25 12.621 15.025 -0.25 6.013 16.303 -0.25 5.821
  [3,16,24.821,-0.25,12.621,15.025,-0.25,6.013,16.303,-0.25,5.821],
// 4 16 2.914 -0.25 -4.433 2.959 -0.25 -2.818 1.655 -0.25 5.484 1.655 -0.25 -13.281
  [4,16,2.914,-0.25,-4.433,2.959,-0.25,-2.818,1.655,-0.25,5.484,1.655,-0.25,-13.281],
// 3 15 3.722 -0.25 0.195 3.233 -0.25 -1.227 9.73 -0.25 -1.916
  [3,15,3.722,-0.25,0.195,3.233,-0.25,-1.227,9.73,-0.25,-1.916],
// 3 16 1.655 -0.25 5.484 3.233 -0.25 -1.227 3.722 -0.25 0.195
  [3,16,1.655,-0.25,5.484,3.233,-0.25,-1.227,3.722,-0.25,0.195],
// 3 16 4.435 -0.25 1.52 5.302 -0.25 2.503 1.655 -0.25 5.484
  [3,16,4.435,-0.25,1.52,5.302,-0.25,2.503,1.655,-0.25,5.484],
// 4 15 9.114 -0.25 5.274 8.193 -0.25 4.893 11.175 -0.25 0.695 10.06 -0.25 5.592
  [4,15,9.114,-0.25,5.274,8.193,-0.25,4.893,11.175,-0.25,0.695,10.06,-0.25,5.592],
// 3 16 5.302 -0.25 2.503 6.23 -0.25 3.429 1.655 -0.25 5.484
  [3,16,5.302,-0.25,2.503,6.23,-0.25,3.429,1.655,-0.25,5.484],
// 3 16 6.23 -0.25 3.429 7.148 -0.25 4.246 1.655 -0.25 5.484
  [3,16,6.23,-0.25,3.429,7.148,-0.25,4.246,1.655,-0.25,5.484],
// 4 15 10.06 -0.25 5.592 11.175 -0.25 0.695 12.022 -0.25 1.12 11.025 -0.25 5.844
  [4,15,10.06,-0.25,5.592,11.175,-0.25,0.695,12.022,-0.25,1.12,11.025,-0.25,5.844],
// 3 16 7.148 -0.25 4.246 8.193 -0.25 4.893 1.655 -0.25 5.484
  [3,16,7.148,-0.25,4.246,8.193,-0.25,4.893,1.655,-0.25,5.484],
// 4 16 11.025 -0.25 5.844 24.821 -0.25 12.621 1.655 -0.25 5.484 10.06 -0.25 5.592
  [4,16,11.025,-0.25,5.844,24.821,-0.25,12.621,1.655,-0.25,5.484,10.06,-0.25,5.592],
// 3 16 1.655 -0.25 5.484 8.193 -0.25 4.893 9.114 -0.25 5.274
  [3,16,1.655,-0.25,5.484,8.193,-0.25,4.893,9.114,-0.25,5.274],
// 3 16 1.655 -0.25 5.484 9.114 -0.25 5.274 10.06 -0.25 5.592
  [3,16,1.655,-0.25,5.484,9.114,-0.25,5.274,10.06,-0.25,5.592],
// 4 15 12.005 -0.25 6.031 11.025 -0.25 5.844 12.945 -0.25 1.333 12.995 -0.25 6.151
  [4,15,12.005,-0.25,6.031,11.025,-0.25,5.844,12.945,-0.25,1.333,12.995,-0.25,6.151],
// 3 16 24.821 -0.25 12.621 11.025 -0.25 5.844 12.005 -0.25 6.031
  [3,16,24.821,-0.25,12.621,11.025,-0.25,5.844,12.005,-0.25,6.031],
// 3 16 24.821 -0.25 12.621 12.005 -0.25 6.031 12.995 -0.25 6.151
  [3,16,24.821,-0.25,12.621,12.005,-0.25,6.031,12.995,-0.25,6.151],
// 4 16 13.893 -0.25 1.325 12.945 -0.25 1.333 16.878 -0.25 -1.916 15.687 -0.25 0.562
  [4,16,13.893,-0.25,1.325,12.945,-0.25,1.333,16.878,-0.25,-1.916,15.687,-0.25,0.562],
// 4 16 16.878 -0.25 -1.916 16.803 -0.25 -1.131 16.371 -0.25 -0.202 15.687 -0.25 0.562
  [4,16,16.878,-0.25,-1.916,16.803,-0.25,-1.131,16.371,-0.25,-0.202,15.687,-0.25,0.562],
// 3 15 12.022 -0.25 1.12 12.945 -0.25 1.333 11.025 -0.25 5.844
  [3,15,12.022,-0.25,1.12,12.945,-0.25,1.333,11.025,-0.25,5.844],
// 3 15 12.945 -0.25 1.333 13.893 -0.25 1.325 12.995 -0.25 6.151
  [3,15,12.945,-0.25,1.333,13.893,-0.25,1.325,12.995,-0.25,6.151],
// 3 16 15.687 -0.25 0.562 14.812 -0.25 1.094 13.893 -0.25 1.325
  [3,16,15.687,-0.25,0.562,14.812,-0.25,1.094,13.893,-0.25,1.325],
// 3 15 13.893 -0.25 1.325 14.812 -0.25 1.094 15.025 -0.25 6.013
  [3,15,13.893,-0.25,1.325,14.812,-0.25,1.094,15.025,-0.25,6.013],
// 4 15 2.914 -0.25 -4.433 3.098 -0.25 -6.037 9.73 -0.25 -5.352 2.959 -0.25 -2.818
  [4,15,2.914,-0.25,-4.433,3.098,-0.25,-6.037,9.73,-0.25,-5.352,2.959,-0.25,-2.818],
// 3 16 3.396 -0.25 -7.204 3.098 -0.25 -6.037 1.655 -0.25 -13.281
  [3,16,3.396,-0.25,-7.204,3.098,-0.25,-6.037,1.655,-0.25,-13.281],
// 3 16 1.655 -0.25 -13.281 3.098 -0.25 -6.037 2.914 -0.25 -4.433
  [3,16,1.655,-0.25,-13.281,3.098,-0.25,-6.037,2.914,-0.25,-4.433],
// 4 16 12.858 -0.25 -9.066 16.878 -0.25 -7.467 9.73 -0.25 -5.352 12.01 -0.25 -8.8
  [4,16,12.858,-0.25,-9.066,16.878,-0.25,-7.467,9.73,-0.25,-5.352,12.01,-0.25,-8.8],
// 4 15 9.39 -0.25 -13.169 12.01 -0.25 -8.8 11.235 -0.25 -8.364 8.344 -0.25 -12.749
  [4,15,9.39,-0.25,-13.169,12.01,-0.25,-8.8,11.235,-0.25,-8.364,8.344,-0.25,-12.749],
// 3 16 10.565 -0.25 -7.78 11.235 -0.25 -8.364 10.101 -0.25 -7.042
  [3,16,10.565,-0.25,-7.78,11.235,-0.25,-8.364,10.101,-0.25,-7.042],
// 4 15 12.01 -0.25 -8.8 10.474 -0.25 -13.48 11.583 -0.25 -13.678 12.858 -0.25 -9.066
  [4,15,12.01,-0.25,-8.8,10.474,-0.25,-13.48,11.583,-0.25,-13.678,12.858,-0.25,-9.066],
// 3 16 11.235 -0.25 -8.364 12.01 -0.25 -8.8 9.73 -0.25 -5.352
  [3,16,11.235,-0.25,-8.364,12.01,-0.25,-8.8,9.73,-0.25,-5.352],
// 4 15 12.858 -0.25 -9.066 11.583 -0.25 -13.678 12.863 -0.25 -13.775 13.744 -0.25 -9.15
  [4,15,12.858,-0.25,-9.066,11.583,-0.25,-13.678,12.863,-0.25,-13.775,13.744,-0.25,-9.15],
// 3 16 16.878 -0.25 -7.467 12.858 -0.25 -9.066 13.744 -0.25 -9.15
  [3,16,16.878,-0.25,-7.467,12.858,-0.25,-9.066,13.744,-0.25,-9.15],
// 4 15 14.492 -0.25 -9.117 14.147 -0.25 -13.779 15.428 -0.25 -13.692 15.213 -0.25 -8.916
  [4,15,14.492,-0.25,-9.117,14.147,-0.25,-13.779,15.428,-0.25,-13.692,15.213,-0.25,-8.916],
// 4 16 13.744 -0.25 -9.15 14.492 -0.25 -9.117 15.213 -0.25 -8.916 15.873 -0.25 -8.561
  [4,16,13.744,-0.25,-9.15,14.492,-0.25,-9.117,15.213,-0.25,-8.916,15.873,-0.25,-8.561],
// 4 15 16.439 -0.25 -8.071 15.873 -0.25 -8.561 18.891 -0.25 -12.784 19.906 -0.25 -12.231
  [4,15,16.439,-0.25,-8.071,15.873,-0.25,-8.561,18.891,-0.25,-12.784,19.906,-0.25,-12.231],
// 3 15 16.439 -0.25 -8.071 19.906 -0.25 -12.231 20.85 -0.25 -11.563
  [3,15,16.439,-0.25,-8.071,19.906,-0.25,-12.231,20.85,-0.25,-11.563],
// 3 16 22.727 -0.25 -9.318 24.821 -0.25 -13.281 23.115 -0.25 -8.416
  [3,16,22.727,-0.25,-9.318,24.821,-0.25,-13.281,23.115,-0.25,-8.416],
// 4 15 22.213 -0.25 -10.155 22.727 -0.25 -9.318 16.878 -0.25 -7.467 21.583 -0.25 -10.91
  [4,15,22.213,-0.25,-10.155,22.727,-0.25,-9.318,16.878,-0.25,-7.467,21.583,-0.25,-10.91],
// 3 16 22.213 -0.25 -10.155 24.821 -0.25 -13.281 22.727 -0.25 -9.318
  [3,16,22.213,-0.25,-10.155,24.821,-0.25,-13.281,22.727,-0.25,-9.318],
// 3 16 21.583 -0.25 -10.91 24.821 -0.25 -13.281 22.213 -0.25 -10.155
  [3,16,21.583,-0.25,-10.91,24.821,-0.25,-13.281,22.213,-0.25,-10.155],
// 3 16 18.891 -0.25 -12.784 24.821 -0.25 -13.281 19.906 -0.25 -12.231
  [3,16,18.891,-0.25,-12.784,24.821,-0.25,-13.281,19.906,-0.25,-12.231],
// 4 15 16.699 -0.25 -13.512 17.817 -0.25 -13.213 15.213 -0.25 -8.916 15.428 -0.25 -13.692
  [4,15,16.699,-0.25,-13.512,17.817,-0.25,-13.213,15.213,-0.25,-8.916,15.428,-0.25,-13.692],
// 3 16 17.817 -0.25 -13.213 24.821 -0.25 -13.281 18.891 -0.25 -12.784
  [3,16,17.817,-0.25,-13.213,24.821,-0.25,-13.281,18.891,-0.25,-12.784],
// 3 16 16.699 -0.25 -13.512 24.821 -0.25 -13.281 17.817 -0.25 -13.213
  [3,16,16.699,-0.25,-13.512,24.821,-0.25,-13.281,17.817,-0.25,-13.213],
// 3 16 15.428 -0.25 -13.692 24.821 -0.25 -13.281 16.699 -0.25 -13.512
  [3,16,15.428,-0.25,-13.692,24.821,-0.25,-13.281,16.699,-0.25,-13.512],
// 4 15 14.147 -0.25 -13.779 14.492 -0.25 -9.117 13.744 -0.25 -9.15 12.863 -0.25 -13.775
  [4,15,14.147,-0.25,-13.779,14.492,-0.25,-9.117,13.744,-0.25,-9.15,12.863,-0.25,-13.775],
// 3 16 14.147 -0.25 -13.779 24.821 -0.25 -13.281 15.428 -0.25 -13.692
  [3,16,14.147,-0.25,-13.779,24.821,-0.25,-13.281,15.428,-0.25,-13.692],
// 3 16 9.39 -0.25 -13.169 8.344 -0.25 -12.749 1.655 -0.25 -13.281
  [3,16,9.39,-0.25,-13.169,8.344,-0.25,-12.749,1.655,-0.25,-13.281],
// 3 15 9.39 -0.25 -13.169 10.474 -0.25 -13.48 12.01 -0.25 -8.8
  [3,15,9.39,-0.25,-13.169,10.474,-0.25,-13.48,12.01,-0.25,-8.8],
// 3 16 10.474 -0.25 -13.48 9.39 -0.25 -13.169 1.655 -0.25 -13.281
  [3,16,10.474,-0.25,-13.48,9.39,-0.25,-13.169,1.655,-0.25,-13.281],
// 4 15 3.833 -0.25 -8.327 4.402 -0.25 -9.389 9.817 -0.25 -6.219 3.396 -0.25 -7.204
  [4,15,3.833,-0.25,-8.327,4.402,-0.25,-9.389,9.817,-0.25,-6.219,3.396,-0.25,-7.204],
// 4 15 5.681 -0.25 -11.007 10.565 -0.25 -7.78 10.101 -0.25 -7.042 4.986 -0.25 -10.241
  [4,15,5.681,-0.25,-11.007,10.565,-0.25,-7.78,10.101,-0.25,-7.042,4.986,-0.25,-10.241],
// 3 16 4.402 -0.25 -9.389 1.655 -0.25 -13.281 4.986 -0.25 -10.241
  [3,16,4.402,-0.25,-9.389,1.655,-0.25,-13.281,4.986,-0.25,-10.241],
// 3 16 3.396 -0.25 -7.204 1.655 -0.25 -13.281 3.833 -0.25 -8.327
  [3,16,3.396,-0.25,-7.204,1.655,-0.25,-13.281,3.833,-0.25,-8.327],
// 3 16 3.833 -0.25 -8.327 1.655 -0.25 -13.281 4.402 -0.25 -9.389
  [3,16,3.833,-0.25,-8.327,1.655,-0.25,-13.281,4.402,-0.25,-9.389],
// 3 16 6.472 -0.25 -11.672 1.655 -0.25 -13.281 7.347 -0.25 -12.224
  [3,16,6.472,-0.25,-11.672,1.655,-0.25,-13.281,7.347,-0.25,-12.224],
// 3 16 4.986 -0.25 -10.241 1.655 -0.25 -13.281 5.681 -0.25 -11.007
  [3,16,4.986,-0.25,-10.241,1.655,-0.25,-13.281,5.681,-0.25,-11.007],
// 3 16 5.681 -0.25 -11.007 1.655 -0.25 -13.281 6.472 -0.25 -11.672
  [3,16,5.681,-0.25,-11.007,1.655,-0.25,-13.281,6.472,-0.25,-11.672],
];
module ldraw_lib__197915c(step=0, col=false, unit=2/5, alt=false, line=0.2, solid=!$preview)
    makepoly(ldraw_lib__197915c(), step=step, col=col, unit=unit, alt=alt, line=line, solid=solid);
ldraw_lib__197915c(line=0.2);
